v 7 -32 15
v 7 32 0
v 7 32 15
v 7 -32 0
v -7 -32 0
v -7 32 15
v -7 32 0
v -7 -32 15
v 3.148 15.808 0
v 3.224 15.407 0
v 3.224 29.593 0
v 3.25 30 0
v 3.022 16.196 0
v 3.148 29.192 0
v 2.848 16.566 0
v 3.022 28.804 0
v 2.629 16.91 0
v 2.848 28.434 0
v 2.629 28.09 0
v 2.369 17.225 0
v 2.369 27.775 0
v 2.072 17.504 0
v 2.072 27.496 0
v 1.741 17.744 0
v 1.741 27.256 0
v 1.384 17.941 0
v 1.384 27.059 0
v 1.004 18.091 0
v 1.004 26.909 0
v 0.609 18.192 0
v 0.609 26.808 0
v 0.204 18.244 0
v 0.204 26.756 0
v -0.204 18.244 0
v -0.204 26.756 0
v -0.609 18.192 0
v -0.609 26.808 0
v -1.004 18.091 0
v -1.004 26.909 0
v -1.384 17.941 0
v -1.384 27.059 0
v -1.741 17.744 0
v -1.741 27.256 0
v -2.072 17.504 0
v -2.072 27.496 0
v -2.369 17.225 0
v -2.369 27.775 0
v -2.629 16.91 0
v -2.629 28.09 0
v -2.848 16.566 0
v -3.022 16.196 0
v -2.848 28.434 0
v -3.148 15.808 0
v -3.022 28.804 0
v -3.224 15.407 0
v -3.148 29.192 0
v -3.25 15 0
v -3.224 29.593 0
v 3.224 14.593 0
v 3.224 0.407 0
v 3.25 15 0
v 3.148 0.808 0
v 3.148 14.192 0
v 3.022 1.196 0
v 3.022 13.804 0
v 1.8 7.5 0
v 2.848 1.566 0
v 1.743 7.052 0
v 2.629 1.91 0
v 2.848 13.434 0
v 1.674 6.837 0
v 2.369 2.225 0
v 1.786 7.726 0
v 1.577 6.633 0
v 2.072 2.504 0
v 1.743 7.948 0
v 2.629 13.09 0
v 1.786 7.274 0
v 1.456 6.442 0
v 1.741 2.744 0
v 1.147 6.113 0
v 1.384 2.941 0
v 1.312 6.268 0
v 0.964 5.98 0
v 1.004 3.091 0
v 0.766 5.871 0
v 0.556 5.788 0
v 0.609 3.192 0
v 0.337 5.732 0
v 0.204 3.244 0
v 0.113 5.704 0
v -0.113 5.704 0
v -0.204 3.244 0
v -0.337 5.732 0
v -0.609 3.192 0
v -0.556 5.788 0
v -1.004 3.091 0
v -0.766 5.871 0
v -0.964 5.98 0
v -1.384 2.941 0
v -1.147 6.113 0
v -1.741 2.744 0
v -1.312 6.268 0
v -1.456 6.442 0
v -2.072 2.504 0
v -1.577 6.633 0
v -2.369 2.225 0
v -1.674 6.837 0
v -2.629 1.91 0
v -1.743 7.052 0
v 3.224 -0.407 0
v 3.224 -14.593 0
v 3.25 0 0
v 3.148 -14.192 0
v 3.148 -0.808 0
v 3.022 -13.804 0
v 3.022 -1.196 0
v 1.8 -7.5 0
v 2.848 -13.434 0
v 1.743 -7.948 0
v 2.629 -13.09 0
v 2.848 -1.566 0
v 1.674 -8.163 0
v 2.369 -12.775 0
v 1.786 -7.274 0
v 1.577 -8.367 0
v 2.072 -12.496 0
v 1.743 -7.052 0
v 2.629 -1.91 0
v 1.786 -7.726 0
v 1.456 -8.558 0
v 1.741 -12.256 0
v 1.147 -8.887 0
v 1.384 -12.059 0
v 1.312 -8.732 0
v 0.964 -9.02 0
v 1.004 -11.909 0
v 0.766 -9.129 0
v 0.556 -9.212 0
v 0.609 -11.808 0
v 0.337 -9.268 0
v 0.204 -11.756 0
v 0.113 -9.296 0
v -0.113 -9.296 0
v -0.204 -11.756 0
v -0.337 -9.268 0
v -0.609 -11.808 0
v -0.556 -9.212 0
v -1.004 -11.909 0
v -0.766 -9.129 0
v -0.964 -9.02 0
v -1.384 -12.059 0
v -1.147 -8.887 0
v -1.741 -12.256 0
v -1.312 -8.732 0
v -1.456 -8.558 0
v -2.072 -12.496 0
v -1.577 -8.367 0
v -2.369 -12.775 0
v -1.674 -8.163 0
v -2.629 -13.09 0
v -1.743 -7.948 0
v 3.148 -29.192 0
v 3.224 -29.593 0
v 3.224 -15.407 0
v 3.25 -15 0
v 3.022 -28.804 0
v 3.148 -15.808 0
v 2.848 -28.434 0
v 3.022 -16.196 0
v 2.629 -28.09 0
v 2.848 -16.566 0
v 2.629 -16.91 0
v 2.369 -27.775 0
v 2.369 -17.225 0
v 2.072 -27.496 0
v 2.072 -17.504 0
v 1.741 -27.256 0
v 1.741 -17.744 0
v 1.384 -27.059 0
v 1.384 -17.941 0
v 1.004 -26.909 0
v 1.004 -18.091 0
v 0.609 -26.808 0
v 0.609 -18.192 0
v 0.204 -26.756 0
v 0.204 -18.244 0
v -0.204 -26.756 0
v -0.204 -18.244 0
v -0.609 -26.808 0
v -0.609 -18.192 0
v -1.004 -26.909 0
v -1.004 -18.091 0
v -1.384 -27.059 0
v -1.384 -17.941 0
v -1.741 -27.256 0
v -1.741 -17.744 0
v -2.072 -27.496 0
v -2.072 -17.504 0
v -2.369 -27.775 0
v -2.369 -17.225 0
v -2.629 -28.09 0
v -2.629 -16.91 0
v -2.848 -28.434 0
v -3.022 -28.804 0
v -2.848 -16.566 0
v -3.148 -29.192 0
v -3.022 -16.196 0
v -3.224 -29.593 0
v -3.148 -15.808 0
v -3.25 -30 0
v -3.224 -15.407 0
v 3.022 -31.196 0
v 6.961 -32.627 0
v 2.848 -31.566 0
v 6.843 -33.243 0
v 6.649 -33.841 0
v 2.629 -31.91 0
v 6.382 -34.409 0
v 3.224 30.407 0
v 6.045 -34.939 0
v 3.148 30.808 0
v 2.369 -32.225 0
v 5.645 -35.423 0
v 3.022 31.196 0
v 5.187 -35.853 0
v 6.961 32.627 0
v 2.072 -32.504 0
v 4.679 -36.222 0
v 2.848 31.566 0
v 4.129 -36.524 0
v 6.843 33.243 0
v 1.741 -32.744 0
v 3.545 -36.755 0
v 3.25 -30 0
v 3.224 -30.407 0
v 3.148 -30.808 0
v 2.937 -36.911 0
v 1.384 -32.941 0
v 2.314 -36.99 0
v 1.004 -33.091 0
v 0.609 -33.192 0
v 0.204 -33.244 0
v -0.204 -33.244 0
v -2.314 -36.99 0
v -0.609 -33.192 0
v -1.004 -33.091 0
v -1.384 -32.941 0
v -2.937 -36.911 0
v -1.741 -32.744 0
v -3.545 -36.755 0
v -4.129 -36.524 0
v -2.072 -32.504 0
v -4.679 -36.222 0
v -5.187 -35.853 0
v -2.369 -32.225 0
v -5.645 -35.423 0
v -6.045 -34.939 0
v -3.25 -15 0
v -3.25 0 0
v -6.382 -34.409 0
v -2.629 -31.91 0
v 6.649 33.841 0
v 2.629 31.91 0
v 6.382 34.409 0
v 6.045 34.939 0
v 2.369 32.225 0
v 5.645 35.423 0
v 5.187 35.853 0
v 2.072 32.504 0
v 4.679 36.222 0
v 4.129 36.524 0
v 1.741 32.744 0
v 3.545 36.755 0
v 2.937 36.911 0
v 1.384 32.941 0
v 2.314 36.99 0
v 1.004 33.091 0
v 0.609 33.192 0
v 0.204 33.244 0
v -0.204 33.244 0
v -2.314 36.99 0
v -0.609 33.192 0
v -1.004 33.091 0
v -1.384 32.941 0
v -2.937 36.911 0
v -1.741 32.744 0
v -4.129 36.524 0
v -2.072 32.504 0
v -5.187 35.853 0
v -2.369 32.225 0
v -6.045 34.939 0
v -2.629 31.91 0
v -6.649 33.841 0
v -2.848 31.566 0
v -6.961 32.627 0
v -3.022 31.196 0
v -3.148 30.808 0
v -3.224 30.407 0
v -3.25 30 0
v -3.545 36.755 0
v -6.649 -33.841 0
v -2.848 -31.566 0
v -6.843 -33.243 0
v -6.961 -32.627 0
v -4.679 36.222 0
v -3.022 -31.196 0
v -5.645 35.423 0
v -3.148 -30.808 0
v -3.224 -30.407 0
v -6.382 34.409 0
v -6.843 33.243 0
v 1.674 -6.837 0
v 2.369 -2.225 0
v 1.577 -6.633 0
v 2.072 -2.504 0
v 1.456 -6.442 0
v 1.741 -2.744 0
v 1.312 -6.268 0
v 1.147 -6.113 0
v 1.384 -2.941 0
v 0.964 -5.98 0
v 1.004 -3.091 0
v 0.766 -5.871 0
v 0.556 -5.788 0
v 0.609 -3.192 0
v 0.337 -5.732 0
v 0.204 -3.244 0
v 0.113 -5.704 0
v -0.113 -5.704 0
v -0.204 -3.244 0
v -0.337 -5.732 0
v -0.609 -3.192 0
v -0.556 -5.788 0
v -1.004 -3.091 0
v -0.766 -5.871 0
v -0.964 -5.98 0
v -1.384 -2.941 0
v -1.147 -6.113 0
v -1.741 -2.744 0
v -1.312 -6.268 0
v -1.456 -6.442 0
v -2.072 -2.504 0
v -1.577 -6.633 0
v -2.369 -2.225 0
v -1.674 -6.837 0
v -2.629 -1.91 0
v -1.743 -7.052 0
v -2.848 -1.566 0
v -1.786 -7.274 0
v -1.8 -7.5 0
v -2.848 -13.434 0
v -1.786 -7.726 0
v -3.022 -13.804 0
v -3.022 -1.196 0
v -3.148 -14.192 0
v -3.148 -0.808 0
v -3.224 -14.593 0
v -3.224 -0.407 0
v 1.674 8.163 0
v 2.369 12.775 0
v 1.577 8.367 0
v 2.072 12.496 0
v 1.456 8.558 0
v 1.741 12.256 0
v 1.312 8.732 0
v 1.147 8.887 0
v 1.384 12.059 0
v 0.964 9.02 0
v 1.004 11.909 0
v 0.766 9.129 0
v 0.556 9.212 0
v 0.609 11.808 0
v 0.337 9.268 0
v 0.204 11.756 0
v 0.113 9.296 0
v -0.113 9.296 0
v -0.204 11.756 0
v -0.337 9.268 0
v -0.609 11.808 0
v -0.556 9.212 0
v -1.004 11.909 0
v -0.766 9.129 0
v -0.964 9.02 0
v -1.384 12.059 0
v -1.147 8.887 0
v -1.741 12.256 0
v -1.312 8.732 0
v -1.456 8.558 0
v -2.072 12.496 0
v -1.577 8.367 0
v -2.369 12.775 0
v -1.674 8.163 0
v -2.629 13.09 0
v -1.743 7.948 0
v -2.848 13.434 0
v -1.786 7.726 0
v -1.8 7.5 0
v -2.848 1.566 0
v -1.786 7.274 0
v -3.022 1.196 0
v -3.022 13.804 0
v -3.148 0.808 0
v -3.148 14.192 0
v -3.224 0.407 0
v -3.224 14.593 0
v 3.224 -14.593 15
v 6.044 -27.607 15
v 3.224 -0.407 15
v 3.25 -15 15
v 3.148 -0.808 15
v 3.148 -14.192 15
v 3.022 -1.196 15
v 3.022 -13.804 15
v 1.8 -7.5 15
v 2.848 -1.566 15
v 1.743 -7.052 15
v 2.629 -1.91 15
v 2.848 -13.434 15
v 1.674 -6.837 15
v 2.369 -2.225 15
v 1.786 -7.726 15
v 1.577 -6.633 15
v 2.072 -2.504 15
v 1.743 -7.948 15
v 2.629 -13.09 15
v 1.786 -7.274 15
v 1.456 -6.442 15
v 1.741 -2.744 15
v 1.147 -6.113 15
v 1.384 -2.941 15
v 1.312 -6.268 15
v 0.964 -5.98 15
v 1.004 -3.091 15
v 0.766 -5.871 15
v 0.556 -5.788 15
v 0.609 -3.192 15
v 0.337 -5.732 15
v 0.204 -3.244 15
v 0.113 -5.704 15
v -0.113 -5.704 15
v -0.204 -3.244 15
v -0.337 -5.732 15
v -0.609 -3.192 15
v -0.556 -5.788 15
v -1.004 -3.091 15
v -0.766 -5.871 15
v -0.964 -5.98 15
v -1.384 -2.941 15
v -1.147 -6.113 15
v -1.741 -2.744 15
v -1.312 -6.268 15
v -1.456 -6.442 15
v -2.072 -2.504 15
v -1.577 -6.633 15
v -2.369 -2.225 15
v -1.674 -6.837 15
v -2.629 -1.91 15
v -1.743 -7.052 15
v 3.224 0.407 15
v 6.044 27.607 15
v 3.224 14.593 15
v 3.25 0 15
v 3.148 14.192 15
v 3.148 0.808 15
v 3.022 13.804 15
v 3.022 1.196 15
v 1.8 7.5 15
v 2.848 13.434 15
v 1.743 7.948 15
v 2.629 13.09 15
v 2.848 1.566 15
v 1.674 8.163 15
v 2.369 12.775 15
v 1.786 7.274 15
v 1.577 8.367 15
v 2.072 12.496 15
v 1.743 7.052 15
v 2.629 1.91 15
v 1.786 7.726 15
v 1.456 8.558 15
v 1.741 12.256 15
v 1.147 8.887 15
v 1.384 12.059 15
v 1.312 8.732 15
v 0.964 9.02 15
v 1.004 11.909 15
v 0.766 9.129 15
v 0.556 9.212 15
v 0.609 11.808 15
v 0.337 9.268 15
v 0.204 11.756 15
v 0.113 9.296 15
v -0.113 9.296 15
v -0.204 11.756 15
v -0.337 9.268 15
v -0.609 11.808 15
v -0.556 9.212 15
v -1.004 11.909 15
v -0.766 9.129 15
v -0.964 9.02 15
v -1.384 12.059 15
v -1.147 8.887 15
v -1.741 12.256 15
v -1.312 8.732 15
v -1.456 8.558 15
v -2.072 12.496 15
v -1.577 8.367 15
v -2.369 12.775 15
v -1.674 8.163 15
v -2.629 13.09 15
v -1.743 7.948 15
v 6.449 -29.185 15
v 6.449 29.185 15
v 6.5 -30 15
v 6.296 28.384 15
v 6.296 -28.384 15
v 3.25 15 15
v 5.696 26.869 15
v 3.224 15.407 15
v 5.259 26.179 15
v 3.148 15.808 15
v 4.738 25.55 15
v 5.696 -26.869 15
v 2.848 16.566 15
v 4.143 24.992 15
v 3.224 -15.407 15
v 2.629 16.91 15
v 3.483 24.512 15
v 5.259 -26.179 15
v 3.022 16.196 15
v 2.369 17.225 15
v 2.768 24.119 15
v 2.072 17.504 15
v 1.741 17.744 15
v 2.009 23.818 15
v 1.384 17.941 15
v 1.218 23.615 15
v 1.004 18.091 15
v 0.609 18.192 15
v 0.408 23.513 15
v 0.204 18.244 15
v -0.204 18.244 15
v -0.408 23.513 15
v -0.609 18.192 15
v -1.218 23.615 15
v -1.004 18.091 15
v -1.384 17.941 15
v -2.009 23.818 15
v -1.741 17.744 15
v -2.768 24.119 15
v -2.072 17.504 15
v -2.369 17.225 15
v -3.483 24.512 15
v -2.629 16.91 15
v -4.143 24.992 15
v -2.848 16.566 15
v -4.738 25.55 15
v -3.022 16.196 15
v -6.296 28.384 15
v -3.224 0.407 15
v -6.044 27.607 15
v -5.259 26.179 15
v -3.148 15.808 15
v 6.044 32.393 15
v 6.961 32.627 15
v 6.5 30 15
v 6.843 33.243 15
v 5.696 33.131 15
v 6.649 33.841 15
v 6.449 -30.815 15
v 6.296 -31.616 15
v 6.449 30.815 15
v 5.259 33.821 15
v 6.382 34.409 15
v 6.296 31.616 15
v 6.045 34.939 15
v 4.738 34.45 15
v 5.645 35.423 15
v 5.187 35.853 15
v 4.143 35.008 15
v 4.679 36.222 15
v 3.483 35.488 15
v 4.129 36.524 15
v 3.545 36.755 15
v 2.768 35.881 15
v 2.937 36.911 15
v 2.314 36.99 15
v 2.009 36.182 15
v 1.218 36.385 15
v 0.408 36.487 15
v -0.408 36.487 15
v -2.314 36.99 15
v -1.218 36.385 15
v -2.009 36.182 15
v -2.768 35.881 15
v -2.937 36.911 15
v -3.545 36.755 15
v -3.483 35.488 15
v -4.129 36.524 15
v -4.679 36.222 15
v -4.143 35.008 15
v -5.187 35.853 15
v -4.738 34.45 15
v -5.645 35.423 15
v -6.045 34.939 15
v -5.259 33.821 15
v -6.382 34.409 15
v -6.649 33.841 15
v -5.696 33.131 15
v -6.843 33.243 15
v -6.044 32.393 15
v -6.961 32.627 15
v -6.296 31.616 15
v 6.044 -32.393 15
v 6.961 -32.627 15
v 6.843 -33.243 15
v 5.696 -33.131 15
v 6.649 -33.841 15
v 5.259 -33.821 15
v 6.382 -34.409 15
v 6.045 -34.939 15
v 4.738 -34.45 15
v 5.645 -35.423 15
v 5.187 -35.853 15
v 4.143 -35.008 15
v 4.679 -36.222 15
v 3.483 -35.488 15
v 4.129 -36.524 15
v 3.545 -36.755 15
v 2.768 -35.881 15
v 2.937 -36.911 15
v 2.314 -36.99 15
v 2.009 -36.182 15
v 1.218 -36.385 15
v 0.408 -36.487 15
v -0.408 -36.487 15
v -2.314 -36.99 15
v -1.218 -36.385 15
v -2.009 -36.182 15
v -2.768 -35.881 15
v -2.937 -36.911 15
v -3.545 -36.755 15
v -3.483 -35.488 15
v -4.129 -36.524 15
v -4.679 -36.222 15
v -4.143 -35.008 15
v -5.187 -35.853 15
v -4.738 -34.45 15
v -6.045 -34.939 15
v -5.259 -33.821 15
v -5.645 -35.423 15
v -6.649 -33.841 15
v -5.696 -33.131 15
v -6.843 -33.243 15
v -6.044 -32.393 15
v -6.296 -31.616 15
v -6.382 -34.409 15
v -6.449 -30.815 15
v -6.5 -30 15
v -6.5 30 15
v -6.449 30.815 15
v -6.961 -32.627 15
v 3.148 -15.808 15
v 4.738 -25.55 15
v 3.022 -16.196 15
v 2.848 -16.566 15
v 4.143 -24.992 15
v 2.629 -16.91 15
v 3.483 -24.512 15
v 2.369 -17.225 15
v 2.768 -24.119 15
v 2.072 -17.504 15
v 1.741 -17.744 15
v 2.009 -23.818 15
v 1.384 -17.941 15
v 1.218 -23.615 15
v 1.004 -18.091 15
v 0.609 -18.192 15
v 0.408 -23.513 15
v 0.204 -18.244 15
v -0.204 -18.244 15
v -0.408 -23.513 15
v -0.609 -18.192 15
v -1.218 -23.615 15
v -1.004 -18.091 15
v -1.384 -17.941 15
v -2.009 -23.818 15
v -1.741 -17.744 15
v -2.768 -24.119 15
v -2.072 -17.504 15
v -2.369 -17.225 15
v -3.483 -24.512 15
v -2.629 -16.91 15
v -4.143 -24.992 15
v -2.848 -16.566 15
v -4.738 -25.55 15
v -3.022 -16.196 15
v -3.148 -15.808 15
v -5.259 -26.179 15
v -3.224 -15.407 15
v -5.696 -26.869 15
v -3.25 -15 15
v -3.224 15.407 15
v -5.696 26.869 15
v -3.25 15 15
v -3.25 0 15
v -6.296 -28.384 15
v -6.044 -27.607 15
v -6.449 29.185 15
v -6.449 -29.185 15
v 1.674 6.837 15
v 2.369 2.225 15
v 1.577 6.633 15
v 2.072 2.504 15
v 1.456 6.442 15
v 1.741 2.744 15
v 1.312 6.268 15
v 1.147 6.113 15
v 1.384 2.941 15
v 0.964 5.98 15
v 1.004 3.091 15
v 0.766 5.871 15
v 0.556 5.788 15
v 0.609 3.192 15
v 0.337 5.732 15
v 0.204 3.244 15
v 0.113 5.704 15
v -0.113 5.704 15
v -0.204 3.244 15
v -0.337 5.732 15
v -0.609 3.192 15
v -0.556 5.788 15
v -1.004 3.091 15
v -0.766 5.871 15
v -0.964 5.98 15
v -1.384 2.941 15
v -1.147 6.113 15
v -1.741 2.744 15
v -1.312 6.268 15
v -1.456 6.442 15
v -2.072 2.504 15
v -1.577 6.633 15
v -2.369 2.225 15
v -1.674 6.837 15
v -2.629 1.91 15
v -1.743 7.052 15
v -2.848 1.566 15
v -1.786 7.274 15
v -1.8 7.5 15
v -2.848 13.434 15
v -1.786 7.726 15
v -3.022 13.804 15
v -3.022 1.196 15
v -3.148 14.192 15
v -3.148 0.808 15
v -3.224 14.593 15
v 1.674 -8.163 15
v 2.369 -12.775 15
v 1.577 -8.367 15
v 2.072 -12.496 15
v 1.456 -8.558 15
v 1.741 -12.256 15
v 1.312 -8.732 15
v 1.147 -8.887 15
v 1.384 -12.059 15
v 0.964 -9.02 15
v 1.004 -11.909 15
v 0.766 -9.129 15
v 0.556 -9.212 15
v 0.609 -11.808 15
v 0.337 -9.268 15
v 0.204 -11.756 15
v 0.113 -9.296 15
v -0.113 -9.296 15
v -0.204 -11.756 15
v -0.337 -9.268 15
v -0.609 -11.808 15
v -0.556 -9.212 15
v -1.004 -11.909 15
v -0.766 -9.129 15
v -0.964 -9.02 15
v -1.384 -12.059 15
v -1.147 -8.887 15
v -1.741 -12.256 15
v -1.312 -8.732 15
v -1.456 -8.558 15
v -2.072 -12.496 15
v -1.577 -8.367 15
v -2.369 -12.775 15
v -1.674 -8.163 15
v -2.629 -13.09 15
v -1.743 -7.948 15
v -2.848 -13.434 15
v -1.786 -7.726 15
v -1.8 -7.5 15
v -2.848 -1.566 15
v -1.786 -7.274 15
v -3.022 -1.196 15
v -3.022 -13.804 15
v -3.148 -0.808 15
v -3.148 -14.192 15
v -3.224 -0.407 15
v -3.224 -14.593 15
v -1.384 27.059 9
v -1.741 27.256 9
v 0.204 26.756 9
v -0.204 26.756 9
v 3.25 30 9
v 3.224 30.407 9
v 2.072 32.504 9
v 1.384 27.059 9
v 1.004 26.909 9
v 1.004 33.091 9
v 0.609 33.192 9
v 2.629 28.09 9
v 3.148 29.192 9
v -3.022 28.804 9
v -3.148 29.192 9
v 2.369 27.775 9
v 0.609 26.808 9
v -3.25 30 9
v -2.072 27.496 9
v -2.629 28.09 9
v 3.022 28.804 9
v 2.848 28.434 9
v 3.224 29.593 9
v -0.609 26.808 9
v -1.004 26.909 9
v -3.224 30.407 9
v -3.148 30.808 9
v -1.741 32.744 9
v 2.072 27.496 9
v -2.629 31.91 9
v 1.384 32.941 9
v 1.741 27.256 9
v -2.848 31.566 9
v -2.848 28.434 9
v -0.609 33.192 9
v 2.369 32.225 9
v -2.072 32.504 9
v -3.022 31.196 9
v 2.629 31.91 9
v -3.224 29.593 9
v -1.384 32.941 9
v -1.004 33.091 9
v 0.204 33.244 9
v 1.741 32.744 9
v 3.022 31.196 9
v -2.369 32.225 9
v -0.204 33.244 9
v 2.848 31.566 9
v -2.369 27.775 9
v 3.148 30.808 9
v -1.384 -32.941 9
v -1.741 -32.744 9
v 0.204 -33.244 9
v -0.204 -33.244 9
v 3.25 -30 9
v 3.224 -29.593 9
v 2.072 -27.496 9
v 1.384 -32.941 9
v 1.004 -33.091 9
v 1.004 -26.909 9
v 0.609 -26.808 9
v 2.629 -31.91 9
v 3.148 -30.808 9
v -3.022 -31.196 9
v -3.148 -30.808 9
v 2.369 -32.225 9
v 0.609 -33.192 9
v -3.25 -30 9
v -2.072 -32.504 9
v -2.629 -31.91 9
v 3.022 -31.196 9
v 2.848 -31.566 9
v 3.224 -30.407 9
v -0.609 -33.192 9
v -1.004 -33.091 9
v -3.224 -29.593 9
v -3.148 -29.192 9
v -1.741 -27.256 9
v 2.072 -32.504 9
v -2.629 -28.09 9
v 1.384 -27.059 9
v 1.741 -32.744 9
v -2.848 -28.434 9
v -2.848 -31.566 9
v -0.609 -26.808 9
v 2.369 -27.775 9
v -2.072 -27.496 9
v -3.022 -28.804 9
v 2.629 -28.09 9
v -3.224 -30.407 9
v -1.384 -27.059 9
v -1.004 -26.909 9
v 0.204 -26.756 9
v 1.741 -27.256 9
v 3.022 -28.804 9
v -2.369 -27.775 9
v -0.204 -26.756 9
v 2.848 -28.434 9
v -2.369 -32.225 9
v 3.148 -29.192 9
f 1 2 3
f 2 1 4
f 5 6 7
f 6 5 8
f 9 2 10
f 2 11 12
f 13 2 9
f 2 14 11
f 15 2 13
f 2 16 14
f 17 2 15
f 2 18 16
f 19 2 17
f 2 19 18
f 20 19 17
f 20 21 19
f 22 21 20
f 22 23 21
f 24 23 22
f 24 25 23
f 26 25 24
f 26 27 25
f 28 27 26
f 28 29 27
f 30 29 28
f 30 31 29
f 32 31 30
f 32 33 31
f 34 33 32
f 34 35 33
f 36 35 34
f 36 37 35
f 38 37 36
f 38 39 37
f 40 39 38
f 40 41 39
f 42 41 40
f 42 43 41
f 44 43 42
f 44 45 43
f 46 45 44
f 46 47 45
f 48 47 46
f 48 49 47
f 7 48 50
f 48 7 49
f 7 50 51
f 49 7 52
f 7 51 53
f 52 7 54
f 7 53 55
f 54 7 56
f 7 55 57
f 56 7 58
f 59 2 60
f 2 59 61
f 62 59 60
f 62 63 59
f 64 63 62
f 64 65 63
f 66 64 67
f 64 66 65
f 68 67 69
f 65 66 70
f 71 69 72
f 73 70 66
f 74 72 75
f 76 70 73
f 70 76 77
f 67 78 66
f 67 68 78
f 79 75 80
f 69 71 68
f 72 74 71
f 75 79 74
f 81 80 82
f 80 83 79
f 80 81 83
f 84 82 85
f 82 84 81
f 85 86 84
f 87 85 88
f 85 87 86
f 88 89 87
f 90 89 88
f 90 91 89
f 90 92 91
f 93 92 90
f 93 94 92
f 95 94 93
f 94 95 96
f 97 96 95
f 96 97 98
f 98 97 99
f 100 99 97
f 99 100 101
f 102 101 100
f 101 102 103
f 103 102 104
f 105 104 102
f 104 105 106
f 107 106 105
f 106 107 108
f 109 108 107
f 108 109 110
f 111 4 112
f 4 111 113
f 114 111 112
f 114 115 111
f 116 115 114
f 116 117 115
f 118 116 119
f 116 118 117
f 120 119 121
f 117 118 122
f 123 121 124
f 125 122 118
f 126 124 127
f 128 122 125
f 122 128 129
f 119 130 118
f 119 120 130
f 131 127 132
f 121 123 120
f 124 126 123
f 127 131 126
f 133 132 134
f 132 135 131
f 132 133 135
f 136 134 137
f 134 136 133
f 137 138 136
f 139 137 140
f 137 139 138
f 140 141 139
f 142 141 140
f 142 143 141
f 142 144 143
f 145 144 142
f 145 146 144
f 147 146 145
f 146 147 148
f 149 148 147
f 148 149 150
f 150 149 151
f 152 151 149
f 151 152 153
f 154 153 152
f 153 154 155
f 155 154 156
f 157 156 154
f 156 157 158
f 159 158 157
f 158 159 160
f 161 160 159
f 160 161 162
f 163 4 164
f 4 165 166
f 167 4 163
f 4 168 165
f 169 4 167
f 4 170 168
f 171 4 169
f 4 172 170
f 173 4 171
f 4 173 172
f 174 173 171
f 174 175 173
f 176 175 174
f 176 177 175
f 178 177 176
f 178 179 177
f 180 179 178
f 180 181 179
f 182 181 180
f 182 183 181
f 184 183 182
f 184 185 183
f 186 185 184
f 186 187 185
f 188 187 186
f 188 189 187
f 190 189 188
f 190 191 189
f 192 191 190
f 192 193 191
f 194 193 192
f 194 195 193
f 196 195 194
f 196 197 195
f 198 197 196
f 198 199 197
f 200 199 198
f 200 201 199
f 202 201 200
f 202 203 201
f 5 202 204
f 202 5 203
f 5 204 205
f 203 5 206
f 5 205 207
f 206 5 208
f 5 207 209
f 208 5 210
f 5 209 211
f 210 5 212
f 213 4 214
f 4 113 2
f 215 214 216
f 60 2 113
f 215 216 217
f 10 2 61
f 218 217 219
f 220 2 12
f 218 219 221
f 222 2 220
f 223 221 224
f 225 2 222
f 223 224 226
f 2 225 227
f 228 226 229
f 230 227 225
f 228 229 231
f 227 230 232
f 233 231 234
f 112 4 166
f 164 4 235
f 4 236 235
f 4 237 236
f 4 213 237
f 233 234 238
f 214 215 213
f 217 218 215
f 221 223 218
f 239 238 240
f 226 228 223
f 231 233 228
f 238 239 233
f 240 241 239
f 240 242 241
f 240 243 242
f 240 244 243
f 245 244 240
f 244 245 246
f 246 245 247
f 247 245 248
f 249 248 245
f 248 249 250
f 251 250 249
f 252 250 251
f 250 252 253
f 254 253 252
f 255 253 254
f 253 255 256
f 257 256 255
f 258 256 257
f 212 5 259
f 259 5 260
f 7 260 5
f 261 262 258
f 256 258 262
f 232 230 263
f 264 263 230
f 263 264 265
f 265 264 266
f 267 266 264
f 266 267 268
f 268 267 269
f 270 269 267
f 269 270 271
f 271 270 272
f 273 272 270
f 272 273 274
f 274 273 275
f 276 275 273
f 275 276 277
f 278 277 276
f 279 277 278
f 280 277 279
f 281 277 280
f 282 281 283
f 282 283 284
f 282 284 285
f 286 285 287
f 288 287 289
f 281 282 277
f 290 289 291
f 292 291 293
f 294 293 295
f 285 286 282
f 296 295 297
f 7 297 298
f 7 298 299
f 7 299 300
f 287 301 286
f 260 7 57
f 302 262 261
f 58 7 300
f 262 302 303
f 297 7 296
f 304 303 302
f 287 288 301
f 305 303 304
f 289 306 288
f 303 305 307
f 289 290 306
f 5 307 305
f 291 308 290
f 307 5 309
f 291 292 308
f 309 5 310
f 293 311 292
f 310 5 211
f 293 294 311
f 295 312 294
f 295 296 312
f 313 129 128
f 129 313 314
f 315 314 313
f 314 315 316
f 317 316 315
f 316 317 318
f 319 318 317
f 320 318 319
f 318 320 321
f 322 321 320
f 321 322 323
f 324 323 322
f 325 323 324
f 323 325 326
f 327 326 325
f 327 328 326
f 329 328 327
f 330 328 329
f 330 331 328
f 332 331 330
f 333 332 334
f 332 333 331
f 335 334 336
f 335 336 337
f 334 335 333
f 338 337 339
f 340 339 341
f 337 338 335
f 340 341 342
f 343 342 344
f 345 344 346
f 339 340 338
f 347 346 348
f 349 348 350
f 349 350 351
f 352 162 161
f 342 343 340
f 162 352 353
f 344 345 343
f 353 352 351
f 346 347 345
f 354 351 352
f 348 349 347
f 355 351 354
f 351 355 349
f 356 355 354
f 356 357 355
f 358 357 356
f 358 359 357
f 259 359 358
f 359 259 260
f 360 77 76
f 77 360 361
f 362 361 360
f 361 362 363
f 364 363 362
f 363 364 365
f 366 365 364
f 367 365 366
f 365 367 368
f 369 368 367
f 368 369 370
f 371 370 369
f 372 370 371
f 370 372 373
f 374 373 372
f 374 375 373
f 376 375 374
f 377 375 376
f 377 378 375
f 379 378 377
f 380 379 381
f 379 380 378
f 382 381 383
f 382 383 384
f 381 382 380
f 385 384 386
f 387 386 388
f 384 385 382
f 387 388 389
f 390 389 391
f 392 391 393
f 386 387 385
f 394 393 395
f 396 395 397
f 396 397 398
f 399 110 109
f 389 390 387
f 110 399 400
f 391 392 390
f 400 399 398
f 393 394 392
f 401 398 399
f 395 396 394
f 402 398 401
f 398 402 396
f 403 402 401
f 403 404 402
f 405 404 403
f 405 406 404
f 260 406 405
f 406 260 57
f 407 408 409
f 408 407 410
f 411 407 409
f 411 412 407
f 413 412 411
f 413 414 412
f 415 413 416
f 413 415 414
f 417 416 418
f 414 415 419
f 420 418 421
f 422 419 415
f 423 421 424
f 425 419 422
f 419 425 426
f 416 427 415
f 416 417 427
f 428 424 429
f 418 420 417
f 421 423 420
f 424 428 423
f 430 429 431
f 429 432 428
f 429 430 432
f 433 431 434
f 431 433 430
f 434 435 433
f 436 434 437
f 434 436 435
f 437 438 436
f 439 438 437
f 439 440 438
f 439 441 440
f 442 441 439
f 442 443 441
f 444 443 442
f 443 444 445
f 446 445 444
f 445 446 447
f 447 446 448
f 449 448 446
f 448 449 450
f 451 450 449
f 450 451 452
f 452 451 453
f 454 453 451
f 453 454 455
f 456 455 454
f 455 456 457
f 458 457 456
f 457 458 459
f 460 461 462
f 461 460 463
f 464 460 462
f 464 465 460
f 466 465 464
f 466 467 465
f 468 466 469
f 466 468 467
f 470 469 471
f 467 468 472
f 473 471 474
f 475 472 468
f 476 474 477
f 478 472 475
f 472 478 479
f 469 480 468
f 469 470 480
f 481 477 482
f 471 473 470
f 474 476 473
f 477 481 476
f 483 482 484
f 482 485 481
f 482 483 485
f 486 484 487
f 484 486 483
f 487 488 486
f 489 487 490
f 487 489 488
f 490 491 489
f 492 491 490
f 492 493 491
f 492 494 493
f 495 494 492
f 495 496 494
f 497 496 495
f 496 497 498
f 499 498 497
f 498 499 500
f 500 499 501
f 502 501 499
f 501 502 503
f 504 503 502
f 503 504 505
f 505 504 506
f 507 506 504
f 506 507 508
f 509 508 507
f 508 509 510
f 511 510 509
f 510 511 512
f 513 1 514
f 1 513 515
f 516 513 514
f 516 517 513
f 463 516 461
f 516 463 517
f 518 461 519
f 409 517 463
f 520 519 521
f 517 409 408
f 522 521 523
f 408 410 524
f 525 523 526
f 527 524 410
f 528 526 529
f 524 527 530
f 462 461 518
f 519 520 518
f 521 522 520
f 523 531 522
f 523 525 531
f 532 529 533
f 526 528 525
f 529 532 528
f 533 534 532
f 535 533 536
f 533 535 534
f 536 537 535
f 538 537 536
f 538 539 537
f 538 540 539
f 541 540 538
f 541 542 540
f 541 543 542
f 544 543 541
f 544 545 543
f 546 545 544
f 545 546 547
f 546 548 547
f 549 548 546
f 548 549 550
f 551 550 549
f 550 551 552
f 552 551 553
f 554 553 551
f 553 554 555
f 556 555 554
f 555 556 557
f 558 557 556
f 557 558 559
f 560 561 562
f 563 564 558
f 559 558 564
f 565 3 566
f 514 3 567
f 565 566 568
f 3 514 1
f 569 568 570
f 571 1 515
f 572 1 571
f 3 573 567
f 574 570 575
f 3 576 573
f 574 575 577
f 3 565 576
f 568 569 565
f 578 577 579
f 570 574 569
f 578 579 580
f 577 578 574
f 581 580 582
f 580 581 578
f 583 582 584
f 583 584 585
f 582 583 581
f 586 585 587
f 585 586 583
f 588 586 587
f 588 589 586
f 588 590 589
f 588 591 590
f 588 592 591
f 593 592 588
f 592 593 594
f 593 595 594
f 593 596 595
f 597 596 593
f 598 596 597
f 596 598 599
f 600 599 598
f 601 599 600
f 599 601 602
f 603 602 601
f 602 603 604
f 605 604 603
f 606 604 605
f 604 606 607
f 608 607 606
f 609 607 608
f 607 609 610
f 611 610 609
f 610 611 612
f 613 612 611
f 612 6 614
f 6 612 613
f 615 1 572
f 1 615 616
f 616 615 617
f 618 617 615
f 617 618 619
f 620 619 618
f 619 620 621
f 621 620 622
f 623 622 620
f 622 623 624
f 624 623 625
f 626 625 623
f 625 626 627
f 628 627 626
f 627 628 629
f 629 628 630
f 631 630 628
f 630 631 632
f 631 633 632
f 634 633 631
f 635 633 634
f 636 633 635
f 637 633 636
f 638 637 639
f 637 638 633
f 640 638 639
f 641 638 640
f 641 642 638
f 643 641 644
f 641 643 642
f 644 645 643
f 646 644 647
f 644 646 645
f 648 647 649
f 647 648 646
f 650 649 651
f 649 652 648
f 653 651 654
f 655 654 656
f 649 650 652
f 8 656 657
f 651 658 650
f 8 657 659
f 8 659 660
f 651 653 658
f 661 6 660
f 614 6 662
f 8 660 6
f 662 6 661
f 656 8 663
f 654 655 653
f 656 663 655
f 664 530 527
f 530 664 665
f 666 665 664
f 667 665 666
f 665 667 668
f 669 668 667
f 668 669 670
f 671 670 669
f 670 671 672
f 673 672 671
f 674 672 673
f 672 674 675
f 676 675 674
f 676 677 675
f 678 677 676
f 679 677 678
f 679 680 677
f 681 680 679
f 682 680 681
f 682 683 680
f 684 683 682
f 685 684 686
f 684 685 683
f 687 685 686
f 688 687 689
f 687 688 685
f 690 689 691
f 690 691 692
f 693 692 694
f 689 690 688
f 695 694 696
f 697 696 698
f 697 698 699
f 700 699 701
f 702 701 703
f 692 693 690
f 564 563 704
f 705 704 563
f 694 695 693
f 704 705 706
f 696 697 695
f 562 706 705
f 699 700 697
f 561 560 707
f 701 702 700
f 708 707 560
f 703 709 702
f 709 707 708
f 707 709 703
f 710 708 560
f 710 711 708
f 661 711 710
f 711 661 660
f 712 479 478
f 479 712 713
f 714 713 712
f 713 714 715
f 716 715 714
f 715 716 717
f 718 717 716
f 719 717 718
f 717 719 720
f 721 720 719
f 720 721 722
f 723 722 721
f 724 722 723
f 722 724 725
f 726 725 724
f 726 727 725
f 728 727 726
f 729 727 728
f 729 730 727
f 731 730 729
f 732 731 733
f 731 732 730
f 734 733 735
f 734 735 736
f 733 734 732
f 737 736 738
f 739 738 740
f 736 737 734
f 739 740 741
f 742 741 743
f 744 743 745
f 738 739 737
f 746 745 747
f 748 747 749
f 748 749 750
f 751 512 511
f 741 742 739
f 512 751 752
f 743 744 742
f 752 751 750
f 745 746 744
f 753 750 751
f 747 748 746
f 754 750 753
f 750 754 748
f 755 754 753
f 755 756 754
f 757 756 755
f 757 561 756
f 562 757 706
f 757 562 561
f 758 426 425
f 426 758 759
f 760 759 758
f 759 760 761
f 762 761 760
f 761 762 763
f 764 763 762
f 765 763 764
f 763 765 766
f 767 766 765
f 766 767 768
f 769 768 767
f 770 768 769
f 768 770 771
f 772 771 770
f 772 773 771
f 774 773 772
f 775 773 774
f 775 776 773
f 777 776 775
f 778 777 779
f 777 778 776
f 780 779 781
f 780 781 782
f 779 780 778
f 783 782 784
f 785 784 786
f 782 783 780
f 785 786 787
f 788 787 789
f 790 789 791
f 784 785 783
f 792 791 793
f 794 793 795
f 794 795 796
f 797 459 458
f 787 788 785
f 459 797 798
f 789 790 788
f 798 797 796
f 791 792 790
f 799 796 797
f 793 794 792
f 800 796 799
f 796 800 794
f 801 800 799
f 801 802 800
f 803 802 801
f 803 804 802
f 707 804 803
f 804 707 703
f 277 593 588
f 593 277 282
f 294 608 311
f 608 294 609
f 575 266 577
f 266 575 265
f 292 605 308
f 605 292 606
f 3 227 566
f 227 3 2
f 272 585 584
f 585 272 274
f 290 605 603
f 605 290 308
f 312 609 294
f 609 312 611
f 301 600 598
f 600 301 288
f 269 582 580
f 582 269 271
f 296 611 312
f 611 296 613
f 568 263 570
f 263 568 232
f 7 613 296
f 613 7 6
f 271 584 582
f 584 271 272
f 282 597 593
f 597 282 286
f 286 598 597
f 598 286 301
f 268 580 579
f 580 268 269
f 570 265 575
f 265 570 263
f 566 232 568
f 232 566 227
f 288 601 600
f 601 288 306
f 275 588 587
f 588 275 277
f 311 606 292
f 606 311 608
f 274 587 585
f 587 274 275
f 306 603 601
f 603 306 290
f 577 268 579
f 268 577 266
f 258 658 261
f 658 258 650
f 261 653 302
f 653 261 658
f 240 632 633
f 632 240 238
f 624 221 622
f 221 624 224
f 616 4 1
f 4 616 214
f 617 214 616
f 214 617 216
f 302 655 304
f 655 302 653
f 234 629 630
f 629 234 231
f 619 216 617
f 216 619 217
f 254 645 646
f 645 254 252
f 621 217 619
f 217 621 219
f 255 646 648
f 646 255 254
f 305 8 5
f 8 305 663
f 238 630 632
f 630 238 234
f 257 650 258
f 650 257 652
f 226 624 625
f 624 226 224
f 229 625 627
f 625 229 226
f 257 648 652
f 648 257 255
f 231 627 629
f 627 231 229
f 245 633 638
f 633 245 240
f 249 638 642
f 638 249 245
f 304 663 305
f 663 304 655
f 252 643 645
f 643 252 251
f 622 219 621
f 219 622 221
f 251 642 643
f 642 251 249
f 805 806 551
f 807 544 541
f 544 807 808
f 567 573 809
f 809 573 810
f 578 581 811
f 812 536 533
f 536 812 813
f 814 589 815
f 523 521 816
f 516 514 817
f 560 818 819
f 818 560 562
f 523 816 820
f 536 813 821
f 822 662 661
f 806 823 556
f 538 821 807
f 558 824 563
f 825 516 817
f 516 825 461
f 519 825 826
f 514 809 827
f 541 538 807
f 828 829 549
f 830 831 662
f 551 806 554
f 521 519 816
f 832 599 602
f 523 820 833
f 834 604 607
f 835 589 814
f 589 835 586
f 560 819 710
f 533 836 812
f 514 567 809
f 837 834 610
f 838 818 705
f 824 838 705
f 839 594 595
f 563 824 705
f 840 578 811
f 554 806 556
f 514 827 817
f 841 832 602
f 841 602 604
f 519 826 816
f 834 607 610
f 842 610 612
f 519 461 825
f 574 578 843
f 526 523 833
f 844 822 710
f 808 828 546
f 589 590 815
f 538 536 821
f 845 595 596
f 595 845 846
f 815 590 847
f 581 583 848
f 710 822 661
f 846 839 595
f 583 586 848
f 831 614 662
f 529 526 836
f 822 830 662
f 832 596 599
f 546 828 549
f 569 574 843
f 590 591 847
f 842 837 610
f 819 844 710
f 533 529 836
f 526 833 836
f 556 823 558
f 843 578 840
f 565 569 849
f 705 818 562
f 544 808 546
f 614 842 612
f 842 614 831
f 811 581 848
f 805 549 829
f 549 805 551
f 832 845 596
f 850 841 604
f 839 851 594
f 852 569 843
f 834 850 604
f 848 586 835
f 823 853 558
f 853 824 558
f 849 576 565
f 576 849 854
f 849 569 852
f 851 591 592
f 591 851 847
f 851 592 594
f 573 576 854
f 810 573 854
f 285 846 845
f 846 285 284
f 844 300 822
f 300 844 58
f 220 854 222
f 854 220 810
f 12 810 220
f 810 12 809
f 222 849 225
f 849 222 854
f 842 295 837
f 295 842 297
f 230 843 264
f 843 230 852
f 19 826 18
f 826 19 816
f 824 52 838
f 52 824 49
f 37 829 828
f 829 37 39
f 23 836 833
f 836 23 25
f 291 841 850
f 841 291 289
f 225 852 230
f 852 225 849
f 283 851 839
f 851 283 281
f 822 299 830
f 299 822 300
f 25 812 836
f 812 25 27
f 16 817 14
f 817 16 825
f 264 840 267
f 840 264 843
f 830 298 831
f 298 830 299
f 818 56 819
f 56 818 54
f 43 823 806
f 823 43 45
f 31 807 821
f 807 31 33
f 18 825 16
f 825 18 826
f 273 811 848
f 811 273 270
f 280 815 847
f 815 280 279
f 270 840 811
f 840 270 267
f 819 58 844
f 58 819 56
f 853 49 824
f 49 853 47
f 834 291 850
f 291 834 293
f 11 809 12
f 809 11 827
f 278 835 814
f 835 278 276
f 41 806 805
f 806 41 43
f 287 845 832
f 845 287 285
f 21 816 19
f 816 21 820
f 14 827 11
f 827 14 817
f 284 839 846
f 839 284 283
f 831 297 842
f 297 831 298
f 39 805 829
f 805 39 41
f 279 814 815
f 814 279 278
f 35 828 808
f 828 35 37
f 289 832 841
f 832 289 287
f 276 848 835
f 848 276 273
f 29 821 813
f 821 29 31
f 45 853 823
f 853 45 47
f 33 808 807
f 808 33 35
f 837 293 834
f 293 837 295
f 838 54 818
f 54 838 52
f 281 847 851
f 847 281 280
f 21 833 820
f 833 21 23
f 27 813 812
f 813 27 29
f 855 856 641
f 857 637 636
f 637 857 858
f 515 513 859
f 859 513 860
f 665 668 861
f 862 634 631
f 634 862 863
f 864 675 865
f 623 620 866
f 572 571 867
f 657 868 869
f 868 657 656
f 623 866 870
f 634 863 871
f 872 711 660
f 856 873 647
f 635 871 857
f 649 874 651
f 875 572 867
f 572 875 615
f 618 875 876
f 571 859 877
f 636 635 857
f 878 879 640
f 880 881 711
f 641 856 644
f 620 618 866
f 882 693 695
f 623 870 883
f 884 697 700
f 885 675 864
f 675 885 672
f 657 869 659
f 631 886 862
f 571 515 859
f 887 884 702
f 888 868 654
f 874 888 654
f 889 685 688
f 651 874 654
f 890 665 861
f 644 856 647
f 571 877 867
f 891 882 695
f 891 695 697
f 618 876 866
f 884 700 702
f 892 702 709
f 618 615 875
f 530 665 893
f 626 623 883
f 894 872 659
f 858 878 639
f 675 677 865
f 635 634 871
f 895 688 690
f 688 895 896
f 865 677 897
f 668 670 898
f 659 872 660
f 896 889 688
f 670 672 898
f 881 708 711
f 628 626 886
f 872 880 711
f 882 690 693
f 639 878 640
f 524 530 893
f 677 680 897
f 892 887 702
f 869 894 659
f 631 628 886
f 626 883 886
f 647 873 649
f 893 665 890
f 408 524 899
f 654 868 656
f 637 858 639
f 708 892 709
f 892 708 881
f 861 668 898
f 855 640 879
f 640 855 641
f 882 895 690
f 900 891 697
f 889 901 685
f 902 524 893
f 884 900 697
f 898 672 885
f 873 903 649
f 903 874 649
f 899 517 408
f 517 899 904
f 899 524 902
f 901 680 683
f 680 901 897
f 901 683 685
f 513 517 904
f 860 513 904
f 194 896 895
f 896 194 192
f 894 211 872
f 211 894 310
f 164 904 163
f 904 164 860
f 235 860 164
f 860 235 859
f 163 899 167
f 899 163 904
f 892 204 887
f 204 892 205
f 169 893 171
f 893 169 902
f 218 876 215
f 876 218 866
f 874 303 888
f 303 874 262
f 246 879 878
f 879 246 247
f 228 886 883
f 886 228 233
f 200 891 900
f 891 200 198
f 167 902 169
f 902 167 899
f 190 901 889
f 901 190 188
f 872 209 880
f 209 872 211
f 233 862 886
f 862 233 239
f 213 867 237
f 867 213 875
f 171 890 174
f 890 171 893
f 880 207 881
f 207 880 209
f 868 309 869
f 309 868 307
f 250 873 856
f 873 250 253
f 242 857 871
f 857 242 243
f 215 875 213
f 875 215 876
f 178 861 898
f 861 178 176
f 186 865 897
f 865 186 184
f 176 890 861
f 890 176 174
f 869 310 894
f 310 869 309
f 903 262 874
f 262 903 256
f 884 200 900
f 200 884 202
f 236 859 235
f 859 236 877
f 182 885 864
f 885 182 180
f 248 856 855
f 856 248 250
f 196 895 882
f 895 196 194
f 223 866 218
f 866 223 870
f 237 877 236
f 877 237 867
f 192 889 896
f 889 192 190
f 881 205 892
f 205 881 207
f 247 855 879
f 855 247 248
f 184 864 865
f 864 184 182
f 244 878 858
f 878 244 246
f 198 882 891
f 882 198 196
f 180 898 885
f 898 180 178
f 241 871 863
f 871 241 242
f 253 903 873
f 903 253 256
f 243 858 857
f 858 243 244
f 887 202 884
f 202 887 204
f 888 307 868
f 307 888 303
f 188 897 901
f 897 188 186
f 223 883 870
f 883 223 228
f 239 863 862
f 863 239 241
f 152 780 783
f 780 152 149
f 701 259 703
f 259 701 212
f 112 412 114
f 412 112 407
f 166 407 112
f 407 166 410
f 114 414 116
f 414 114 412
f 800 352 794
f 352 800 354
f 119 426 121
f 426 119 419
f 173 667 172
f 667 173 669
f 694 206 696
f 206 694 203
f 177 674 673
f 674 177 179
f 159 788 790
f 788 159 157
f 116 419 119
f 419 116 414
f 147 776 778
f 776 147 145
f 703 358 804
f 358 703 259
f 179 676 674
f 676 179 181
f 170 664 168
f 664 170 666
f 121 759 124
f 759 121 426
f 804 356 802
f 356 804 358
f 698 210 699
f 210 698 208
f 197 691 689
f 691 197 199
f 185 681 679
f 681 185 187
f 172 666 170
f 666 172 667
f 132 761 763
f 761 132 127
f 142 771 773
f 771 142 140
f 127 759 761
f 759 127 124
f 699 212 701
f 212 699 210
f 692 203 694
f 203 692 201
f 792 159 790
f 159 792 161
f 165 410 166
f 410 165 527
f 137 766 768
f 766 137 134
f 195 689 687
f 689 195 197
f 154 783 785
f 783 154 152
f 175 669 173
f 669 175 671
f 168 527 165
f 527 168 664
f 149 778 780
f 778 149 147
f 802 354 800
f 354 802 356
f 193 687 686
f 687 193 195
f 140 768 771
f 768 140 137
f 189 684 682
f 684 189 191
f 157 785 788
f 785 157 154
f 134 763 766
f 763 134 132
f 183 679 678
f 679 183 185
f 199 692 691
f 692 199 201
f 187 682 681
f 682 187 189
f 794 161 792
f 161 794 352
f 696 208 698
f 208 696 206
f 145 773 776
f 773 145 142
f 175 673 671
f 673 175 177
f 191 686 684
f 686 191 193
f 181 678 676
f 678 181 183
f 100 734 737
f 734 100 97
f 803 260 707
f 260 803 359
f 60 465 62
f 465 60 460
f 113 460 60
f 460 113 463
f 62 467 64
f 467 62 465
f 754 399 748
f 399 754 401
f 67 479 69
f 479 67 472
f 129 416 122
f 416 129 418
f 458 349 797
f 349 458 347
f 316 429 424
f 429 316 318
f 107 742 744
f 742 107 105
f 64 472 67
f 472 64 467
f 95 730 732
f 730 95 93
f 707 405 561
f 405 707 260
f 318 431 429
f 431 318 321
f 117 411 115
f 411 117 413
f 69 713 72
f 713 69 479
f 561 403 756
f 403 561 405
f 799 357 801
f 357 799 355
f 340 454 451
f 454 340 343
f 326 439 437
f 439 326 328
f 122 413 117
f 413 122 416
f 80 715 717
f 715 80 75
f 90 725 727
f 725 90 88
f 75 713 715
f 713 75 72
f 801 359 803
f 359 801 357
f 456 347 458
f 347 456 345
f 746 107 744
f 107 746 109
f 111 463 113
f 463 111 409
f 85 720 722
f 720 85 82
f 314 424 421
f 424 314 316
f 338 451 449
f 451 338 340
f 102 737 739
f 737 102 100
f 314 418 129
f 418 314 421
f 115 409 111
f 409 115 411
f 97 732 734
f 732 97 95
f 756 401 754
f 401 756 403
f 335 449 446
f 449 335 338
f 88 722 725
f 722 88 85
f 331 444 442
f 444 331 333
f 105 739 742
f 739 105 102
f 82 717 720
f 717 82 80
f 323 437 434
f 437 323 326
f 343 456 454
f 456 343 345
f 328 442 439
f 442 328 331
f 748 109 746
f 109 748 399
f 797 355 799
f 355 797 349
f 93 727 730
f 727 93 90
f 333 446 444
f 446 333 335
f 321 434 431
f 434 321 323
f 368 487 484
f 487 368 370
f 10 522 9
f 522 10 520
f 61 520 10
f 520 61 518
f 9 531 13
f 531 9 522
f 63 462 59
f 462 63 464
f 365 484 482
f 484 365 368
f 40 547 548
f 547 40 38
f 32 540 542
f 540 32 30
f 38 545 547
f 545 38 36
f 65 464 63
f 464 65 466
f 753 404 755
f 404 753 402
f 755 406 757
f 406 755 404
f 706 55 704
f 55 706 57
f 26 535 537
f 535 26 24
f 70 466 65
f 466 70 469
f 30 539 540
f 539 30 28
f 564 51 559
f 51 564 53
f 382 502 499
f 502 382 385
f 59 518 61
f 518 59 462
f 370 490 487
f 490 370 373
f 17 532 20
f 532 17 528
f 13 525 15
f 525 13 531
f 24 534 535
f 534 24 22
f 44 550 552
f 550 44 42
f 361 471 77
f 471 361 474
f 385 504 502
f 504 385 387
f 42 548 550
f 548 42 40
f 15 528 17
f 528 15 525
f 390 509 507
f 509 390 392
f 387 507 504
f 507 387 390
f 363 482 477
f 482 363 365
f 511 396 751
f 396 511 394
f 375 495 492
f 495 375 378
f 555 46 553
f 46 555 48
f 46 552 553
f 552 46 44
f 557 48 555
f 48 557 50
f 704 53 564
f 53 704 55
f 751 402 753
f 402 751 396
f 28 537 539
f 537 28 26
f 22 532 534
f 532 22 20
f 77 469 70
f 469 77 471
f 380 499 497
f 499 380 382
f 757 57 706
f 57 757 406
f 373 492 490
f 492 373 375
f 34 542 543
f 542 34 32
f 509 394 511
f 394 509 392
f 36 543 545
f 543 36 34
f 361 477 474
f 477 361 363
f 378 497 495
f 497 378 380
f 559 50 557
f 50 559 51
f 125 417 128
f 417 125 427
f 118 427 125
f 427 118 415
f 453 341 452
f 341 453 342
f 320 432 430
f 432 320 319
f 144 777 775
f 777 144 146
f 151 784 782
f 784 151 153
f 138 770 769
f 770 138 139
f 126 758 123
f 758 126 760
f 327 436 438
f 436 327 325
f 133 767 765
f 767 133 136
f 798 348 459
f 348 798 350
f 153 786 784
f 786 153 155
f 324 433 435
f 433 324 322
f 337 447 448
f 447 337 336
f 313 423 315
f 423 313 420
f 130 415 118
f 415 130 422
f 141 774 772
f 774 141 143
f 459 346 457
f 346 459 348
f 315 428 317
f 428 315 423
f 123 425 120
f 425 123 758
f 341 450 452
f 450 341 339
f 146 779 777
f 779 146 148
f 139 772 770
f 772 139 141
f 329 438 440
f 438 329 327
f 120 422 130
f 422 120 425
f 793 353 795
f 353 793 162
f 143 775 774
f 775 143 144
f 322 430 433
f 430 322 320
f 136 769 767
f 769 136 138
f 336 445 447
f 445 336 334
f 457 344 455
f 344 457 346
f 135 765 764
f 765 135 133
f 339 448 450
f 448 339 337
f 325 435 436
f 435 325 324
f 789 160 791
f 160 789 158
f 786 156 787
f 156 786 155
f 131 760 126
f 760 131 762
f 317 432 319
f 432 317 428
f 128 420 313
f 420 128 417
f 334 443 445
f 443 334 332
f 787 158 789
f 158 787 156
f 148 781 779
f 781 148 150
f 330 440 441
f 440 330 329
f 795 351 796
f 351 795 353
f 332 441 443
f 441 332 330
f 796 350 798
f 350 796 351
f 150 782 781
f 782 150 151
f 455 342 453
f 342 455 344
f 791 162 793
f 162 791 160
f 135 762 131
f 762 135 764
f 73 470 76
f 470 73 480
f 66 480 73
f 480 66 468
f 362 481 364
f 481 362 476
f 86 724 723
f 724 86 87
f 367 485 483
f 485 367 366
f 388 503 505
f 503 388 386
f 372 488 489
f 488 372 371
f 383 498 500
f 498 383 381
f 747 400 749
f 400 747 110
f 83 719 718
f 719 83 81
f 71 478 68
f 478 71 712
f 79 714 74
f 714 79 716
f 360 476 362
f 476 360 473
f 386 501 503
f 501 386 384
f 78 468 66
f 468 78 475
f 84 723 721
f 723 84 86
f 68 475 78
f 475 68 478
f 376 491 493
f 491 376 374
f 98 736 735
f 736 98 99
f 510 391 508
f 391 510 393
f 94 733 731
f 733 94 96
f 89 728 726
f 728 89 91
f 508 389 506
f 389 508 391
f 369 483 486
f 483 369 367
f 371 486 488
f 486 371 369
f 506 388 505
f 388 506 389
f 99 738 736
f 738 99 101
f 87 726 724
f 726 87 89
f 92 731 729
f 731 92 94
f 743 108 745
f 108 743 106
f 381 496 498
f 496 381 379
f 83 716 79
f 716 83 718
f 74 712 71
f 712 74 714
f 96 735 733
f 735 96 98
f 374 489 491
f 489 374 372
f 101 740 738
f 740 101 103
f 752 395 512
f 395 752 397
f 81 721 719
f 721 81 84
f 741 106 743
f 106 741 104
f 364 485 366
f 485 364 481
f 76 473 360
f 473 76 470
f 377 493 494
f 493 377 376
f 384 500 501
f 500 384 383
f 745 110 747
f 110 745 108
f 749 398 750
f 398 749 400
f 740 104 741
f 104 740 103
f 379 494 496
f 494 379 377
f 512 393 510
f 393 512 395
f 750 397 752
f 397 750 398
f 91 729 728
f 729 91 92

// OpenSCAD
$fn = 50;


difference() {
	union() {
		hull() {
			translate(v = [-2.0000000000, 17.0000000000, 0]) {
				cylinder(h = 15, r = 5);
			}
			translate(v = [2.0000000000, 17.0000000000, 0]) {
				cylinder(h = 15, r = 5);
			}
			translate(v = [-2.0000000000, -17.0000000000, 0]) {
				cylinder(h = 15, r = 5);
			}
			translate(v = [2.0000000000, -17.0000000000, 0]) {
				cylinder(h = 15, r = 5);
			}
		}
		translate(v = [0.0000000000, 22.5000000000, 0]) {
			hull() {
				translate(v = [-2.0000000000, 9.5000000000, 0]) {
					cylinder(h = 15, r = 5);
				}
				translate(v = [2.0000000000, 9.5000000000, 0]) {
					cylinder(h = 15, r = 5);
				}
				translate(v = [-2.0000000000, -9.5000000000, 0]) {
					cylinder(h = 15, r = 5);
				}
				translate(v = [2.0000000000, -9.5000000000, 0]) {
					cylinder(h = 15, r = 5);
				}
			}
		}
		translate(v = [0.0000000000, 22.5000000000, 0]) {
			hull() {
				translate(v = [-2.0000000000, 9.5000000000, 0]) {
					cylinder(h = 15, r = 5);
				}
				translate(v = [2.0000000000, 9.5000000000, 0]) {
					cylinder(h = 15, r = 5);
				}
				translate(v = [-2.0000000000, -9.5000000000, 0]) {
					cylinder(h = 15, r = 5);
				}
				translate(v = [2.0000000000, -9.5000000000, 0]) {
					cylinder(h = 15, r = 5);
				}
			}
		}
		translate(v = [0.0000000000, -22.5000000000, 0]) {
			hull() {
				translate(v = [-2.0000000000, 9.5000000000, 0]) {
					cylinder(h = 15, r = 5);
				}
				translate(v = [2.0000000000, 9.5000000000, 0]) {
					cylinder(h = 15, r = 5);
				}
				translate(v = [-2.0000000000, -9.5000000000, 0]) {
					cylinder(h = 15, r = 5);
				}
				translate(v = [2.0000000000, -9.5000000000, 0]) {
					cylinder(h = 15, r = 5);
				}
			}
		}
		translate(v = [0.0000000000, -22.5000000000, 0]) {
			hull() {
				translate(v = [-2.0000000000, 9.5000000000, 0]) {
					cylinder(h = 15, r = 5);
				}
				translate(v = [2.0000000000, 9.5000000000, 0]) {
					cylinder(h = 15, r = 5);
				}
				translate(v = [-2.0000000000, -9.5000000000, 0]) {
					cylinder(h = 15, r = 5);
				}
				translate(v = [2.0000000000, -9.5000000000, 0]) {
					cylinder(h = 15, r = 5);
				}
			}
		}
	}
	union() {
		translate(v = [0.0000000000, 30.0000000000, 15]) {
			rotate(a = [0, 0, 0]) {
				difference() {
					union() {
						#translate(v = [0, 0, -15.0000000000]) {
							cylinder(h = 15, r = 2.2500000000);
						}
						#translate(v = [0, 0, -6]) {
							cylinder(h = 6, r1 = 3.2500000000, r2 = 6.5000000000);
						}
						#translate(v = [0, 0, -15.0000000000]) {
							cylinder(h = 15, r = 3.2500000000);
						}
						#translate(v = [0, 0, -15.0000000000]) {
							cylinder(h = 15, r = 2.2500000000);
						}
					}
					union();
				}
			}
		}
		translate(v = [0.0000000000, 30.0000000000, 15]) {
			rotate(a = [0, 0, 0]) {
				difference() {
					union() {
						#translate(v = [0, 0, -15.0000000000]) {
							cylinder(h = 15, r = 2.2500000000);
						}
						#translate(v = [0, 0, -6]) {
							cylinder(h = 6, r1 = 3.2500000000, r2 = 6.5000000000);
						}
						#translate(v = [0, 0, -15.0000000000]) {
							cylinder(h = 15, r = 3.2500000000);
						}
						#translate(v = [0, 0, -15.0000000000]) {
							cylinder(h = 15, r = 2.2500000000);
						}
					}
					union();
				}
			}
		}
		translate(v = [0.0000000000, -30.0000000000, 15]) {
			rotate(a = [0, 0, 0]) {
				difference() {
					union() {
						#translate(v = [0, 0, -15.0000000000]) {
							cylinder(h = 15, r = 2.2500000000);
						}
						#translate(v = [0, 0, -6]) {
							cylinder(h = 6, r1 = 3.2500000000, r2 = 6.5000000000);
						}
						#translate(v = [0, 0, -15.0000000000]) {
							cylinder(h = 15, r = 3.2500000000);
						}
						#translate(v = [0, 0, -15.0000000000]) {
							cylinder(h = 15, r = 2.2500000000);
						}
					}
					union();
				}
			}
		}
		translate(v = [0.0000000000, -30.0000000000, 15]) {
			rotate(a = [0, 0, 0]) {
				difference() {
					union() {
						#translate(v = [0, 0, -15.0000000000]) {
							cylinder(h = 15, r = 2.2500000000);
						}
						#translate(v = [0, 0, -6]) {
							cylinder(h = 6, r1 = 3.2500000000, r2 = 6.5000000000);
						}
						#translate(v = [0, 0, -15.0000000000]) {
							cylinder(h = 15, r = 3.2500000000);
						}
						#translate(v = [0, 0, -15.0000000000]) {
							cylinder(h = 15, r = 2.2500000000);
						}
					}
					union();
				}
			}
		}
		translate(v = [0.0000000000, -15.0000000000, 0]) {
			translate(v = [0, 0, -100]) {
				cylinder(h = 200, r = 3.2500000000);
			}
		}
		translate(v = [0, 0, -100]) {
			cylinder(h = 200, r = 3.2500000000);
		}
		translate(v = [0.0000000000, 15.0000000000, 0]) {
			translate(v = [0, 0, -100]) {
				cylinder(h = 200, r = 3.2500000000);
			}
		}
		translate(v = [0.0000000000, -15.0000000000, 0]) {
			translate(v = [0, 0, -100]) {
				cylinder(h = 200, r = 1.8000000000);
			}
		}
		translate(v = [0.0000000000, -7.5000000000, 0]) {
			translate(v = [0, 0, -100]) {
				cylinder(h = 200, r = 1.8000000000);
			}
		}
		translate(v = [0, 0, -100]) {
			cylinder(h = 200, r = 1.8000000000);
		}
		translate(v = [0.0000000000, 7.5000000000, 0]) {
			translate(v = [0, 0, -100]) {
				cylinder(h = 200, r = 1.8000000000);
			}
		}
		translate(v = [0.0000000000, 15.0000000000, 0]) {
			translate(v = [0, 0, -100]) {
				cylinder(h = 200, r = 1.8000000000);
			}
		}
	}
}
